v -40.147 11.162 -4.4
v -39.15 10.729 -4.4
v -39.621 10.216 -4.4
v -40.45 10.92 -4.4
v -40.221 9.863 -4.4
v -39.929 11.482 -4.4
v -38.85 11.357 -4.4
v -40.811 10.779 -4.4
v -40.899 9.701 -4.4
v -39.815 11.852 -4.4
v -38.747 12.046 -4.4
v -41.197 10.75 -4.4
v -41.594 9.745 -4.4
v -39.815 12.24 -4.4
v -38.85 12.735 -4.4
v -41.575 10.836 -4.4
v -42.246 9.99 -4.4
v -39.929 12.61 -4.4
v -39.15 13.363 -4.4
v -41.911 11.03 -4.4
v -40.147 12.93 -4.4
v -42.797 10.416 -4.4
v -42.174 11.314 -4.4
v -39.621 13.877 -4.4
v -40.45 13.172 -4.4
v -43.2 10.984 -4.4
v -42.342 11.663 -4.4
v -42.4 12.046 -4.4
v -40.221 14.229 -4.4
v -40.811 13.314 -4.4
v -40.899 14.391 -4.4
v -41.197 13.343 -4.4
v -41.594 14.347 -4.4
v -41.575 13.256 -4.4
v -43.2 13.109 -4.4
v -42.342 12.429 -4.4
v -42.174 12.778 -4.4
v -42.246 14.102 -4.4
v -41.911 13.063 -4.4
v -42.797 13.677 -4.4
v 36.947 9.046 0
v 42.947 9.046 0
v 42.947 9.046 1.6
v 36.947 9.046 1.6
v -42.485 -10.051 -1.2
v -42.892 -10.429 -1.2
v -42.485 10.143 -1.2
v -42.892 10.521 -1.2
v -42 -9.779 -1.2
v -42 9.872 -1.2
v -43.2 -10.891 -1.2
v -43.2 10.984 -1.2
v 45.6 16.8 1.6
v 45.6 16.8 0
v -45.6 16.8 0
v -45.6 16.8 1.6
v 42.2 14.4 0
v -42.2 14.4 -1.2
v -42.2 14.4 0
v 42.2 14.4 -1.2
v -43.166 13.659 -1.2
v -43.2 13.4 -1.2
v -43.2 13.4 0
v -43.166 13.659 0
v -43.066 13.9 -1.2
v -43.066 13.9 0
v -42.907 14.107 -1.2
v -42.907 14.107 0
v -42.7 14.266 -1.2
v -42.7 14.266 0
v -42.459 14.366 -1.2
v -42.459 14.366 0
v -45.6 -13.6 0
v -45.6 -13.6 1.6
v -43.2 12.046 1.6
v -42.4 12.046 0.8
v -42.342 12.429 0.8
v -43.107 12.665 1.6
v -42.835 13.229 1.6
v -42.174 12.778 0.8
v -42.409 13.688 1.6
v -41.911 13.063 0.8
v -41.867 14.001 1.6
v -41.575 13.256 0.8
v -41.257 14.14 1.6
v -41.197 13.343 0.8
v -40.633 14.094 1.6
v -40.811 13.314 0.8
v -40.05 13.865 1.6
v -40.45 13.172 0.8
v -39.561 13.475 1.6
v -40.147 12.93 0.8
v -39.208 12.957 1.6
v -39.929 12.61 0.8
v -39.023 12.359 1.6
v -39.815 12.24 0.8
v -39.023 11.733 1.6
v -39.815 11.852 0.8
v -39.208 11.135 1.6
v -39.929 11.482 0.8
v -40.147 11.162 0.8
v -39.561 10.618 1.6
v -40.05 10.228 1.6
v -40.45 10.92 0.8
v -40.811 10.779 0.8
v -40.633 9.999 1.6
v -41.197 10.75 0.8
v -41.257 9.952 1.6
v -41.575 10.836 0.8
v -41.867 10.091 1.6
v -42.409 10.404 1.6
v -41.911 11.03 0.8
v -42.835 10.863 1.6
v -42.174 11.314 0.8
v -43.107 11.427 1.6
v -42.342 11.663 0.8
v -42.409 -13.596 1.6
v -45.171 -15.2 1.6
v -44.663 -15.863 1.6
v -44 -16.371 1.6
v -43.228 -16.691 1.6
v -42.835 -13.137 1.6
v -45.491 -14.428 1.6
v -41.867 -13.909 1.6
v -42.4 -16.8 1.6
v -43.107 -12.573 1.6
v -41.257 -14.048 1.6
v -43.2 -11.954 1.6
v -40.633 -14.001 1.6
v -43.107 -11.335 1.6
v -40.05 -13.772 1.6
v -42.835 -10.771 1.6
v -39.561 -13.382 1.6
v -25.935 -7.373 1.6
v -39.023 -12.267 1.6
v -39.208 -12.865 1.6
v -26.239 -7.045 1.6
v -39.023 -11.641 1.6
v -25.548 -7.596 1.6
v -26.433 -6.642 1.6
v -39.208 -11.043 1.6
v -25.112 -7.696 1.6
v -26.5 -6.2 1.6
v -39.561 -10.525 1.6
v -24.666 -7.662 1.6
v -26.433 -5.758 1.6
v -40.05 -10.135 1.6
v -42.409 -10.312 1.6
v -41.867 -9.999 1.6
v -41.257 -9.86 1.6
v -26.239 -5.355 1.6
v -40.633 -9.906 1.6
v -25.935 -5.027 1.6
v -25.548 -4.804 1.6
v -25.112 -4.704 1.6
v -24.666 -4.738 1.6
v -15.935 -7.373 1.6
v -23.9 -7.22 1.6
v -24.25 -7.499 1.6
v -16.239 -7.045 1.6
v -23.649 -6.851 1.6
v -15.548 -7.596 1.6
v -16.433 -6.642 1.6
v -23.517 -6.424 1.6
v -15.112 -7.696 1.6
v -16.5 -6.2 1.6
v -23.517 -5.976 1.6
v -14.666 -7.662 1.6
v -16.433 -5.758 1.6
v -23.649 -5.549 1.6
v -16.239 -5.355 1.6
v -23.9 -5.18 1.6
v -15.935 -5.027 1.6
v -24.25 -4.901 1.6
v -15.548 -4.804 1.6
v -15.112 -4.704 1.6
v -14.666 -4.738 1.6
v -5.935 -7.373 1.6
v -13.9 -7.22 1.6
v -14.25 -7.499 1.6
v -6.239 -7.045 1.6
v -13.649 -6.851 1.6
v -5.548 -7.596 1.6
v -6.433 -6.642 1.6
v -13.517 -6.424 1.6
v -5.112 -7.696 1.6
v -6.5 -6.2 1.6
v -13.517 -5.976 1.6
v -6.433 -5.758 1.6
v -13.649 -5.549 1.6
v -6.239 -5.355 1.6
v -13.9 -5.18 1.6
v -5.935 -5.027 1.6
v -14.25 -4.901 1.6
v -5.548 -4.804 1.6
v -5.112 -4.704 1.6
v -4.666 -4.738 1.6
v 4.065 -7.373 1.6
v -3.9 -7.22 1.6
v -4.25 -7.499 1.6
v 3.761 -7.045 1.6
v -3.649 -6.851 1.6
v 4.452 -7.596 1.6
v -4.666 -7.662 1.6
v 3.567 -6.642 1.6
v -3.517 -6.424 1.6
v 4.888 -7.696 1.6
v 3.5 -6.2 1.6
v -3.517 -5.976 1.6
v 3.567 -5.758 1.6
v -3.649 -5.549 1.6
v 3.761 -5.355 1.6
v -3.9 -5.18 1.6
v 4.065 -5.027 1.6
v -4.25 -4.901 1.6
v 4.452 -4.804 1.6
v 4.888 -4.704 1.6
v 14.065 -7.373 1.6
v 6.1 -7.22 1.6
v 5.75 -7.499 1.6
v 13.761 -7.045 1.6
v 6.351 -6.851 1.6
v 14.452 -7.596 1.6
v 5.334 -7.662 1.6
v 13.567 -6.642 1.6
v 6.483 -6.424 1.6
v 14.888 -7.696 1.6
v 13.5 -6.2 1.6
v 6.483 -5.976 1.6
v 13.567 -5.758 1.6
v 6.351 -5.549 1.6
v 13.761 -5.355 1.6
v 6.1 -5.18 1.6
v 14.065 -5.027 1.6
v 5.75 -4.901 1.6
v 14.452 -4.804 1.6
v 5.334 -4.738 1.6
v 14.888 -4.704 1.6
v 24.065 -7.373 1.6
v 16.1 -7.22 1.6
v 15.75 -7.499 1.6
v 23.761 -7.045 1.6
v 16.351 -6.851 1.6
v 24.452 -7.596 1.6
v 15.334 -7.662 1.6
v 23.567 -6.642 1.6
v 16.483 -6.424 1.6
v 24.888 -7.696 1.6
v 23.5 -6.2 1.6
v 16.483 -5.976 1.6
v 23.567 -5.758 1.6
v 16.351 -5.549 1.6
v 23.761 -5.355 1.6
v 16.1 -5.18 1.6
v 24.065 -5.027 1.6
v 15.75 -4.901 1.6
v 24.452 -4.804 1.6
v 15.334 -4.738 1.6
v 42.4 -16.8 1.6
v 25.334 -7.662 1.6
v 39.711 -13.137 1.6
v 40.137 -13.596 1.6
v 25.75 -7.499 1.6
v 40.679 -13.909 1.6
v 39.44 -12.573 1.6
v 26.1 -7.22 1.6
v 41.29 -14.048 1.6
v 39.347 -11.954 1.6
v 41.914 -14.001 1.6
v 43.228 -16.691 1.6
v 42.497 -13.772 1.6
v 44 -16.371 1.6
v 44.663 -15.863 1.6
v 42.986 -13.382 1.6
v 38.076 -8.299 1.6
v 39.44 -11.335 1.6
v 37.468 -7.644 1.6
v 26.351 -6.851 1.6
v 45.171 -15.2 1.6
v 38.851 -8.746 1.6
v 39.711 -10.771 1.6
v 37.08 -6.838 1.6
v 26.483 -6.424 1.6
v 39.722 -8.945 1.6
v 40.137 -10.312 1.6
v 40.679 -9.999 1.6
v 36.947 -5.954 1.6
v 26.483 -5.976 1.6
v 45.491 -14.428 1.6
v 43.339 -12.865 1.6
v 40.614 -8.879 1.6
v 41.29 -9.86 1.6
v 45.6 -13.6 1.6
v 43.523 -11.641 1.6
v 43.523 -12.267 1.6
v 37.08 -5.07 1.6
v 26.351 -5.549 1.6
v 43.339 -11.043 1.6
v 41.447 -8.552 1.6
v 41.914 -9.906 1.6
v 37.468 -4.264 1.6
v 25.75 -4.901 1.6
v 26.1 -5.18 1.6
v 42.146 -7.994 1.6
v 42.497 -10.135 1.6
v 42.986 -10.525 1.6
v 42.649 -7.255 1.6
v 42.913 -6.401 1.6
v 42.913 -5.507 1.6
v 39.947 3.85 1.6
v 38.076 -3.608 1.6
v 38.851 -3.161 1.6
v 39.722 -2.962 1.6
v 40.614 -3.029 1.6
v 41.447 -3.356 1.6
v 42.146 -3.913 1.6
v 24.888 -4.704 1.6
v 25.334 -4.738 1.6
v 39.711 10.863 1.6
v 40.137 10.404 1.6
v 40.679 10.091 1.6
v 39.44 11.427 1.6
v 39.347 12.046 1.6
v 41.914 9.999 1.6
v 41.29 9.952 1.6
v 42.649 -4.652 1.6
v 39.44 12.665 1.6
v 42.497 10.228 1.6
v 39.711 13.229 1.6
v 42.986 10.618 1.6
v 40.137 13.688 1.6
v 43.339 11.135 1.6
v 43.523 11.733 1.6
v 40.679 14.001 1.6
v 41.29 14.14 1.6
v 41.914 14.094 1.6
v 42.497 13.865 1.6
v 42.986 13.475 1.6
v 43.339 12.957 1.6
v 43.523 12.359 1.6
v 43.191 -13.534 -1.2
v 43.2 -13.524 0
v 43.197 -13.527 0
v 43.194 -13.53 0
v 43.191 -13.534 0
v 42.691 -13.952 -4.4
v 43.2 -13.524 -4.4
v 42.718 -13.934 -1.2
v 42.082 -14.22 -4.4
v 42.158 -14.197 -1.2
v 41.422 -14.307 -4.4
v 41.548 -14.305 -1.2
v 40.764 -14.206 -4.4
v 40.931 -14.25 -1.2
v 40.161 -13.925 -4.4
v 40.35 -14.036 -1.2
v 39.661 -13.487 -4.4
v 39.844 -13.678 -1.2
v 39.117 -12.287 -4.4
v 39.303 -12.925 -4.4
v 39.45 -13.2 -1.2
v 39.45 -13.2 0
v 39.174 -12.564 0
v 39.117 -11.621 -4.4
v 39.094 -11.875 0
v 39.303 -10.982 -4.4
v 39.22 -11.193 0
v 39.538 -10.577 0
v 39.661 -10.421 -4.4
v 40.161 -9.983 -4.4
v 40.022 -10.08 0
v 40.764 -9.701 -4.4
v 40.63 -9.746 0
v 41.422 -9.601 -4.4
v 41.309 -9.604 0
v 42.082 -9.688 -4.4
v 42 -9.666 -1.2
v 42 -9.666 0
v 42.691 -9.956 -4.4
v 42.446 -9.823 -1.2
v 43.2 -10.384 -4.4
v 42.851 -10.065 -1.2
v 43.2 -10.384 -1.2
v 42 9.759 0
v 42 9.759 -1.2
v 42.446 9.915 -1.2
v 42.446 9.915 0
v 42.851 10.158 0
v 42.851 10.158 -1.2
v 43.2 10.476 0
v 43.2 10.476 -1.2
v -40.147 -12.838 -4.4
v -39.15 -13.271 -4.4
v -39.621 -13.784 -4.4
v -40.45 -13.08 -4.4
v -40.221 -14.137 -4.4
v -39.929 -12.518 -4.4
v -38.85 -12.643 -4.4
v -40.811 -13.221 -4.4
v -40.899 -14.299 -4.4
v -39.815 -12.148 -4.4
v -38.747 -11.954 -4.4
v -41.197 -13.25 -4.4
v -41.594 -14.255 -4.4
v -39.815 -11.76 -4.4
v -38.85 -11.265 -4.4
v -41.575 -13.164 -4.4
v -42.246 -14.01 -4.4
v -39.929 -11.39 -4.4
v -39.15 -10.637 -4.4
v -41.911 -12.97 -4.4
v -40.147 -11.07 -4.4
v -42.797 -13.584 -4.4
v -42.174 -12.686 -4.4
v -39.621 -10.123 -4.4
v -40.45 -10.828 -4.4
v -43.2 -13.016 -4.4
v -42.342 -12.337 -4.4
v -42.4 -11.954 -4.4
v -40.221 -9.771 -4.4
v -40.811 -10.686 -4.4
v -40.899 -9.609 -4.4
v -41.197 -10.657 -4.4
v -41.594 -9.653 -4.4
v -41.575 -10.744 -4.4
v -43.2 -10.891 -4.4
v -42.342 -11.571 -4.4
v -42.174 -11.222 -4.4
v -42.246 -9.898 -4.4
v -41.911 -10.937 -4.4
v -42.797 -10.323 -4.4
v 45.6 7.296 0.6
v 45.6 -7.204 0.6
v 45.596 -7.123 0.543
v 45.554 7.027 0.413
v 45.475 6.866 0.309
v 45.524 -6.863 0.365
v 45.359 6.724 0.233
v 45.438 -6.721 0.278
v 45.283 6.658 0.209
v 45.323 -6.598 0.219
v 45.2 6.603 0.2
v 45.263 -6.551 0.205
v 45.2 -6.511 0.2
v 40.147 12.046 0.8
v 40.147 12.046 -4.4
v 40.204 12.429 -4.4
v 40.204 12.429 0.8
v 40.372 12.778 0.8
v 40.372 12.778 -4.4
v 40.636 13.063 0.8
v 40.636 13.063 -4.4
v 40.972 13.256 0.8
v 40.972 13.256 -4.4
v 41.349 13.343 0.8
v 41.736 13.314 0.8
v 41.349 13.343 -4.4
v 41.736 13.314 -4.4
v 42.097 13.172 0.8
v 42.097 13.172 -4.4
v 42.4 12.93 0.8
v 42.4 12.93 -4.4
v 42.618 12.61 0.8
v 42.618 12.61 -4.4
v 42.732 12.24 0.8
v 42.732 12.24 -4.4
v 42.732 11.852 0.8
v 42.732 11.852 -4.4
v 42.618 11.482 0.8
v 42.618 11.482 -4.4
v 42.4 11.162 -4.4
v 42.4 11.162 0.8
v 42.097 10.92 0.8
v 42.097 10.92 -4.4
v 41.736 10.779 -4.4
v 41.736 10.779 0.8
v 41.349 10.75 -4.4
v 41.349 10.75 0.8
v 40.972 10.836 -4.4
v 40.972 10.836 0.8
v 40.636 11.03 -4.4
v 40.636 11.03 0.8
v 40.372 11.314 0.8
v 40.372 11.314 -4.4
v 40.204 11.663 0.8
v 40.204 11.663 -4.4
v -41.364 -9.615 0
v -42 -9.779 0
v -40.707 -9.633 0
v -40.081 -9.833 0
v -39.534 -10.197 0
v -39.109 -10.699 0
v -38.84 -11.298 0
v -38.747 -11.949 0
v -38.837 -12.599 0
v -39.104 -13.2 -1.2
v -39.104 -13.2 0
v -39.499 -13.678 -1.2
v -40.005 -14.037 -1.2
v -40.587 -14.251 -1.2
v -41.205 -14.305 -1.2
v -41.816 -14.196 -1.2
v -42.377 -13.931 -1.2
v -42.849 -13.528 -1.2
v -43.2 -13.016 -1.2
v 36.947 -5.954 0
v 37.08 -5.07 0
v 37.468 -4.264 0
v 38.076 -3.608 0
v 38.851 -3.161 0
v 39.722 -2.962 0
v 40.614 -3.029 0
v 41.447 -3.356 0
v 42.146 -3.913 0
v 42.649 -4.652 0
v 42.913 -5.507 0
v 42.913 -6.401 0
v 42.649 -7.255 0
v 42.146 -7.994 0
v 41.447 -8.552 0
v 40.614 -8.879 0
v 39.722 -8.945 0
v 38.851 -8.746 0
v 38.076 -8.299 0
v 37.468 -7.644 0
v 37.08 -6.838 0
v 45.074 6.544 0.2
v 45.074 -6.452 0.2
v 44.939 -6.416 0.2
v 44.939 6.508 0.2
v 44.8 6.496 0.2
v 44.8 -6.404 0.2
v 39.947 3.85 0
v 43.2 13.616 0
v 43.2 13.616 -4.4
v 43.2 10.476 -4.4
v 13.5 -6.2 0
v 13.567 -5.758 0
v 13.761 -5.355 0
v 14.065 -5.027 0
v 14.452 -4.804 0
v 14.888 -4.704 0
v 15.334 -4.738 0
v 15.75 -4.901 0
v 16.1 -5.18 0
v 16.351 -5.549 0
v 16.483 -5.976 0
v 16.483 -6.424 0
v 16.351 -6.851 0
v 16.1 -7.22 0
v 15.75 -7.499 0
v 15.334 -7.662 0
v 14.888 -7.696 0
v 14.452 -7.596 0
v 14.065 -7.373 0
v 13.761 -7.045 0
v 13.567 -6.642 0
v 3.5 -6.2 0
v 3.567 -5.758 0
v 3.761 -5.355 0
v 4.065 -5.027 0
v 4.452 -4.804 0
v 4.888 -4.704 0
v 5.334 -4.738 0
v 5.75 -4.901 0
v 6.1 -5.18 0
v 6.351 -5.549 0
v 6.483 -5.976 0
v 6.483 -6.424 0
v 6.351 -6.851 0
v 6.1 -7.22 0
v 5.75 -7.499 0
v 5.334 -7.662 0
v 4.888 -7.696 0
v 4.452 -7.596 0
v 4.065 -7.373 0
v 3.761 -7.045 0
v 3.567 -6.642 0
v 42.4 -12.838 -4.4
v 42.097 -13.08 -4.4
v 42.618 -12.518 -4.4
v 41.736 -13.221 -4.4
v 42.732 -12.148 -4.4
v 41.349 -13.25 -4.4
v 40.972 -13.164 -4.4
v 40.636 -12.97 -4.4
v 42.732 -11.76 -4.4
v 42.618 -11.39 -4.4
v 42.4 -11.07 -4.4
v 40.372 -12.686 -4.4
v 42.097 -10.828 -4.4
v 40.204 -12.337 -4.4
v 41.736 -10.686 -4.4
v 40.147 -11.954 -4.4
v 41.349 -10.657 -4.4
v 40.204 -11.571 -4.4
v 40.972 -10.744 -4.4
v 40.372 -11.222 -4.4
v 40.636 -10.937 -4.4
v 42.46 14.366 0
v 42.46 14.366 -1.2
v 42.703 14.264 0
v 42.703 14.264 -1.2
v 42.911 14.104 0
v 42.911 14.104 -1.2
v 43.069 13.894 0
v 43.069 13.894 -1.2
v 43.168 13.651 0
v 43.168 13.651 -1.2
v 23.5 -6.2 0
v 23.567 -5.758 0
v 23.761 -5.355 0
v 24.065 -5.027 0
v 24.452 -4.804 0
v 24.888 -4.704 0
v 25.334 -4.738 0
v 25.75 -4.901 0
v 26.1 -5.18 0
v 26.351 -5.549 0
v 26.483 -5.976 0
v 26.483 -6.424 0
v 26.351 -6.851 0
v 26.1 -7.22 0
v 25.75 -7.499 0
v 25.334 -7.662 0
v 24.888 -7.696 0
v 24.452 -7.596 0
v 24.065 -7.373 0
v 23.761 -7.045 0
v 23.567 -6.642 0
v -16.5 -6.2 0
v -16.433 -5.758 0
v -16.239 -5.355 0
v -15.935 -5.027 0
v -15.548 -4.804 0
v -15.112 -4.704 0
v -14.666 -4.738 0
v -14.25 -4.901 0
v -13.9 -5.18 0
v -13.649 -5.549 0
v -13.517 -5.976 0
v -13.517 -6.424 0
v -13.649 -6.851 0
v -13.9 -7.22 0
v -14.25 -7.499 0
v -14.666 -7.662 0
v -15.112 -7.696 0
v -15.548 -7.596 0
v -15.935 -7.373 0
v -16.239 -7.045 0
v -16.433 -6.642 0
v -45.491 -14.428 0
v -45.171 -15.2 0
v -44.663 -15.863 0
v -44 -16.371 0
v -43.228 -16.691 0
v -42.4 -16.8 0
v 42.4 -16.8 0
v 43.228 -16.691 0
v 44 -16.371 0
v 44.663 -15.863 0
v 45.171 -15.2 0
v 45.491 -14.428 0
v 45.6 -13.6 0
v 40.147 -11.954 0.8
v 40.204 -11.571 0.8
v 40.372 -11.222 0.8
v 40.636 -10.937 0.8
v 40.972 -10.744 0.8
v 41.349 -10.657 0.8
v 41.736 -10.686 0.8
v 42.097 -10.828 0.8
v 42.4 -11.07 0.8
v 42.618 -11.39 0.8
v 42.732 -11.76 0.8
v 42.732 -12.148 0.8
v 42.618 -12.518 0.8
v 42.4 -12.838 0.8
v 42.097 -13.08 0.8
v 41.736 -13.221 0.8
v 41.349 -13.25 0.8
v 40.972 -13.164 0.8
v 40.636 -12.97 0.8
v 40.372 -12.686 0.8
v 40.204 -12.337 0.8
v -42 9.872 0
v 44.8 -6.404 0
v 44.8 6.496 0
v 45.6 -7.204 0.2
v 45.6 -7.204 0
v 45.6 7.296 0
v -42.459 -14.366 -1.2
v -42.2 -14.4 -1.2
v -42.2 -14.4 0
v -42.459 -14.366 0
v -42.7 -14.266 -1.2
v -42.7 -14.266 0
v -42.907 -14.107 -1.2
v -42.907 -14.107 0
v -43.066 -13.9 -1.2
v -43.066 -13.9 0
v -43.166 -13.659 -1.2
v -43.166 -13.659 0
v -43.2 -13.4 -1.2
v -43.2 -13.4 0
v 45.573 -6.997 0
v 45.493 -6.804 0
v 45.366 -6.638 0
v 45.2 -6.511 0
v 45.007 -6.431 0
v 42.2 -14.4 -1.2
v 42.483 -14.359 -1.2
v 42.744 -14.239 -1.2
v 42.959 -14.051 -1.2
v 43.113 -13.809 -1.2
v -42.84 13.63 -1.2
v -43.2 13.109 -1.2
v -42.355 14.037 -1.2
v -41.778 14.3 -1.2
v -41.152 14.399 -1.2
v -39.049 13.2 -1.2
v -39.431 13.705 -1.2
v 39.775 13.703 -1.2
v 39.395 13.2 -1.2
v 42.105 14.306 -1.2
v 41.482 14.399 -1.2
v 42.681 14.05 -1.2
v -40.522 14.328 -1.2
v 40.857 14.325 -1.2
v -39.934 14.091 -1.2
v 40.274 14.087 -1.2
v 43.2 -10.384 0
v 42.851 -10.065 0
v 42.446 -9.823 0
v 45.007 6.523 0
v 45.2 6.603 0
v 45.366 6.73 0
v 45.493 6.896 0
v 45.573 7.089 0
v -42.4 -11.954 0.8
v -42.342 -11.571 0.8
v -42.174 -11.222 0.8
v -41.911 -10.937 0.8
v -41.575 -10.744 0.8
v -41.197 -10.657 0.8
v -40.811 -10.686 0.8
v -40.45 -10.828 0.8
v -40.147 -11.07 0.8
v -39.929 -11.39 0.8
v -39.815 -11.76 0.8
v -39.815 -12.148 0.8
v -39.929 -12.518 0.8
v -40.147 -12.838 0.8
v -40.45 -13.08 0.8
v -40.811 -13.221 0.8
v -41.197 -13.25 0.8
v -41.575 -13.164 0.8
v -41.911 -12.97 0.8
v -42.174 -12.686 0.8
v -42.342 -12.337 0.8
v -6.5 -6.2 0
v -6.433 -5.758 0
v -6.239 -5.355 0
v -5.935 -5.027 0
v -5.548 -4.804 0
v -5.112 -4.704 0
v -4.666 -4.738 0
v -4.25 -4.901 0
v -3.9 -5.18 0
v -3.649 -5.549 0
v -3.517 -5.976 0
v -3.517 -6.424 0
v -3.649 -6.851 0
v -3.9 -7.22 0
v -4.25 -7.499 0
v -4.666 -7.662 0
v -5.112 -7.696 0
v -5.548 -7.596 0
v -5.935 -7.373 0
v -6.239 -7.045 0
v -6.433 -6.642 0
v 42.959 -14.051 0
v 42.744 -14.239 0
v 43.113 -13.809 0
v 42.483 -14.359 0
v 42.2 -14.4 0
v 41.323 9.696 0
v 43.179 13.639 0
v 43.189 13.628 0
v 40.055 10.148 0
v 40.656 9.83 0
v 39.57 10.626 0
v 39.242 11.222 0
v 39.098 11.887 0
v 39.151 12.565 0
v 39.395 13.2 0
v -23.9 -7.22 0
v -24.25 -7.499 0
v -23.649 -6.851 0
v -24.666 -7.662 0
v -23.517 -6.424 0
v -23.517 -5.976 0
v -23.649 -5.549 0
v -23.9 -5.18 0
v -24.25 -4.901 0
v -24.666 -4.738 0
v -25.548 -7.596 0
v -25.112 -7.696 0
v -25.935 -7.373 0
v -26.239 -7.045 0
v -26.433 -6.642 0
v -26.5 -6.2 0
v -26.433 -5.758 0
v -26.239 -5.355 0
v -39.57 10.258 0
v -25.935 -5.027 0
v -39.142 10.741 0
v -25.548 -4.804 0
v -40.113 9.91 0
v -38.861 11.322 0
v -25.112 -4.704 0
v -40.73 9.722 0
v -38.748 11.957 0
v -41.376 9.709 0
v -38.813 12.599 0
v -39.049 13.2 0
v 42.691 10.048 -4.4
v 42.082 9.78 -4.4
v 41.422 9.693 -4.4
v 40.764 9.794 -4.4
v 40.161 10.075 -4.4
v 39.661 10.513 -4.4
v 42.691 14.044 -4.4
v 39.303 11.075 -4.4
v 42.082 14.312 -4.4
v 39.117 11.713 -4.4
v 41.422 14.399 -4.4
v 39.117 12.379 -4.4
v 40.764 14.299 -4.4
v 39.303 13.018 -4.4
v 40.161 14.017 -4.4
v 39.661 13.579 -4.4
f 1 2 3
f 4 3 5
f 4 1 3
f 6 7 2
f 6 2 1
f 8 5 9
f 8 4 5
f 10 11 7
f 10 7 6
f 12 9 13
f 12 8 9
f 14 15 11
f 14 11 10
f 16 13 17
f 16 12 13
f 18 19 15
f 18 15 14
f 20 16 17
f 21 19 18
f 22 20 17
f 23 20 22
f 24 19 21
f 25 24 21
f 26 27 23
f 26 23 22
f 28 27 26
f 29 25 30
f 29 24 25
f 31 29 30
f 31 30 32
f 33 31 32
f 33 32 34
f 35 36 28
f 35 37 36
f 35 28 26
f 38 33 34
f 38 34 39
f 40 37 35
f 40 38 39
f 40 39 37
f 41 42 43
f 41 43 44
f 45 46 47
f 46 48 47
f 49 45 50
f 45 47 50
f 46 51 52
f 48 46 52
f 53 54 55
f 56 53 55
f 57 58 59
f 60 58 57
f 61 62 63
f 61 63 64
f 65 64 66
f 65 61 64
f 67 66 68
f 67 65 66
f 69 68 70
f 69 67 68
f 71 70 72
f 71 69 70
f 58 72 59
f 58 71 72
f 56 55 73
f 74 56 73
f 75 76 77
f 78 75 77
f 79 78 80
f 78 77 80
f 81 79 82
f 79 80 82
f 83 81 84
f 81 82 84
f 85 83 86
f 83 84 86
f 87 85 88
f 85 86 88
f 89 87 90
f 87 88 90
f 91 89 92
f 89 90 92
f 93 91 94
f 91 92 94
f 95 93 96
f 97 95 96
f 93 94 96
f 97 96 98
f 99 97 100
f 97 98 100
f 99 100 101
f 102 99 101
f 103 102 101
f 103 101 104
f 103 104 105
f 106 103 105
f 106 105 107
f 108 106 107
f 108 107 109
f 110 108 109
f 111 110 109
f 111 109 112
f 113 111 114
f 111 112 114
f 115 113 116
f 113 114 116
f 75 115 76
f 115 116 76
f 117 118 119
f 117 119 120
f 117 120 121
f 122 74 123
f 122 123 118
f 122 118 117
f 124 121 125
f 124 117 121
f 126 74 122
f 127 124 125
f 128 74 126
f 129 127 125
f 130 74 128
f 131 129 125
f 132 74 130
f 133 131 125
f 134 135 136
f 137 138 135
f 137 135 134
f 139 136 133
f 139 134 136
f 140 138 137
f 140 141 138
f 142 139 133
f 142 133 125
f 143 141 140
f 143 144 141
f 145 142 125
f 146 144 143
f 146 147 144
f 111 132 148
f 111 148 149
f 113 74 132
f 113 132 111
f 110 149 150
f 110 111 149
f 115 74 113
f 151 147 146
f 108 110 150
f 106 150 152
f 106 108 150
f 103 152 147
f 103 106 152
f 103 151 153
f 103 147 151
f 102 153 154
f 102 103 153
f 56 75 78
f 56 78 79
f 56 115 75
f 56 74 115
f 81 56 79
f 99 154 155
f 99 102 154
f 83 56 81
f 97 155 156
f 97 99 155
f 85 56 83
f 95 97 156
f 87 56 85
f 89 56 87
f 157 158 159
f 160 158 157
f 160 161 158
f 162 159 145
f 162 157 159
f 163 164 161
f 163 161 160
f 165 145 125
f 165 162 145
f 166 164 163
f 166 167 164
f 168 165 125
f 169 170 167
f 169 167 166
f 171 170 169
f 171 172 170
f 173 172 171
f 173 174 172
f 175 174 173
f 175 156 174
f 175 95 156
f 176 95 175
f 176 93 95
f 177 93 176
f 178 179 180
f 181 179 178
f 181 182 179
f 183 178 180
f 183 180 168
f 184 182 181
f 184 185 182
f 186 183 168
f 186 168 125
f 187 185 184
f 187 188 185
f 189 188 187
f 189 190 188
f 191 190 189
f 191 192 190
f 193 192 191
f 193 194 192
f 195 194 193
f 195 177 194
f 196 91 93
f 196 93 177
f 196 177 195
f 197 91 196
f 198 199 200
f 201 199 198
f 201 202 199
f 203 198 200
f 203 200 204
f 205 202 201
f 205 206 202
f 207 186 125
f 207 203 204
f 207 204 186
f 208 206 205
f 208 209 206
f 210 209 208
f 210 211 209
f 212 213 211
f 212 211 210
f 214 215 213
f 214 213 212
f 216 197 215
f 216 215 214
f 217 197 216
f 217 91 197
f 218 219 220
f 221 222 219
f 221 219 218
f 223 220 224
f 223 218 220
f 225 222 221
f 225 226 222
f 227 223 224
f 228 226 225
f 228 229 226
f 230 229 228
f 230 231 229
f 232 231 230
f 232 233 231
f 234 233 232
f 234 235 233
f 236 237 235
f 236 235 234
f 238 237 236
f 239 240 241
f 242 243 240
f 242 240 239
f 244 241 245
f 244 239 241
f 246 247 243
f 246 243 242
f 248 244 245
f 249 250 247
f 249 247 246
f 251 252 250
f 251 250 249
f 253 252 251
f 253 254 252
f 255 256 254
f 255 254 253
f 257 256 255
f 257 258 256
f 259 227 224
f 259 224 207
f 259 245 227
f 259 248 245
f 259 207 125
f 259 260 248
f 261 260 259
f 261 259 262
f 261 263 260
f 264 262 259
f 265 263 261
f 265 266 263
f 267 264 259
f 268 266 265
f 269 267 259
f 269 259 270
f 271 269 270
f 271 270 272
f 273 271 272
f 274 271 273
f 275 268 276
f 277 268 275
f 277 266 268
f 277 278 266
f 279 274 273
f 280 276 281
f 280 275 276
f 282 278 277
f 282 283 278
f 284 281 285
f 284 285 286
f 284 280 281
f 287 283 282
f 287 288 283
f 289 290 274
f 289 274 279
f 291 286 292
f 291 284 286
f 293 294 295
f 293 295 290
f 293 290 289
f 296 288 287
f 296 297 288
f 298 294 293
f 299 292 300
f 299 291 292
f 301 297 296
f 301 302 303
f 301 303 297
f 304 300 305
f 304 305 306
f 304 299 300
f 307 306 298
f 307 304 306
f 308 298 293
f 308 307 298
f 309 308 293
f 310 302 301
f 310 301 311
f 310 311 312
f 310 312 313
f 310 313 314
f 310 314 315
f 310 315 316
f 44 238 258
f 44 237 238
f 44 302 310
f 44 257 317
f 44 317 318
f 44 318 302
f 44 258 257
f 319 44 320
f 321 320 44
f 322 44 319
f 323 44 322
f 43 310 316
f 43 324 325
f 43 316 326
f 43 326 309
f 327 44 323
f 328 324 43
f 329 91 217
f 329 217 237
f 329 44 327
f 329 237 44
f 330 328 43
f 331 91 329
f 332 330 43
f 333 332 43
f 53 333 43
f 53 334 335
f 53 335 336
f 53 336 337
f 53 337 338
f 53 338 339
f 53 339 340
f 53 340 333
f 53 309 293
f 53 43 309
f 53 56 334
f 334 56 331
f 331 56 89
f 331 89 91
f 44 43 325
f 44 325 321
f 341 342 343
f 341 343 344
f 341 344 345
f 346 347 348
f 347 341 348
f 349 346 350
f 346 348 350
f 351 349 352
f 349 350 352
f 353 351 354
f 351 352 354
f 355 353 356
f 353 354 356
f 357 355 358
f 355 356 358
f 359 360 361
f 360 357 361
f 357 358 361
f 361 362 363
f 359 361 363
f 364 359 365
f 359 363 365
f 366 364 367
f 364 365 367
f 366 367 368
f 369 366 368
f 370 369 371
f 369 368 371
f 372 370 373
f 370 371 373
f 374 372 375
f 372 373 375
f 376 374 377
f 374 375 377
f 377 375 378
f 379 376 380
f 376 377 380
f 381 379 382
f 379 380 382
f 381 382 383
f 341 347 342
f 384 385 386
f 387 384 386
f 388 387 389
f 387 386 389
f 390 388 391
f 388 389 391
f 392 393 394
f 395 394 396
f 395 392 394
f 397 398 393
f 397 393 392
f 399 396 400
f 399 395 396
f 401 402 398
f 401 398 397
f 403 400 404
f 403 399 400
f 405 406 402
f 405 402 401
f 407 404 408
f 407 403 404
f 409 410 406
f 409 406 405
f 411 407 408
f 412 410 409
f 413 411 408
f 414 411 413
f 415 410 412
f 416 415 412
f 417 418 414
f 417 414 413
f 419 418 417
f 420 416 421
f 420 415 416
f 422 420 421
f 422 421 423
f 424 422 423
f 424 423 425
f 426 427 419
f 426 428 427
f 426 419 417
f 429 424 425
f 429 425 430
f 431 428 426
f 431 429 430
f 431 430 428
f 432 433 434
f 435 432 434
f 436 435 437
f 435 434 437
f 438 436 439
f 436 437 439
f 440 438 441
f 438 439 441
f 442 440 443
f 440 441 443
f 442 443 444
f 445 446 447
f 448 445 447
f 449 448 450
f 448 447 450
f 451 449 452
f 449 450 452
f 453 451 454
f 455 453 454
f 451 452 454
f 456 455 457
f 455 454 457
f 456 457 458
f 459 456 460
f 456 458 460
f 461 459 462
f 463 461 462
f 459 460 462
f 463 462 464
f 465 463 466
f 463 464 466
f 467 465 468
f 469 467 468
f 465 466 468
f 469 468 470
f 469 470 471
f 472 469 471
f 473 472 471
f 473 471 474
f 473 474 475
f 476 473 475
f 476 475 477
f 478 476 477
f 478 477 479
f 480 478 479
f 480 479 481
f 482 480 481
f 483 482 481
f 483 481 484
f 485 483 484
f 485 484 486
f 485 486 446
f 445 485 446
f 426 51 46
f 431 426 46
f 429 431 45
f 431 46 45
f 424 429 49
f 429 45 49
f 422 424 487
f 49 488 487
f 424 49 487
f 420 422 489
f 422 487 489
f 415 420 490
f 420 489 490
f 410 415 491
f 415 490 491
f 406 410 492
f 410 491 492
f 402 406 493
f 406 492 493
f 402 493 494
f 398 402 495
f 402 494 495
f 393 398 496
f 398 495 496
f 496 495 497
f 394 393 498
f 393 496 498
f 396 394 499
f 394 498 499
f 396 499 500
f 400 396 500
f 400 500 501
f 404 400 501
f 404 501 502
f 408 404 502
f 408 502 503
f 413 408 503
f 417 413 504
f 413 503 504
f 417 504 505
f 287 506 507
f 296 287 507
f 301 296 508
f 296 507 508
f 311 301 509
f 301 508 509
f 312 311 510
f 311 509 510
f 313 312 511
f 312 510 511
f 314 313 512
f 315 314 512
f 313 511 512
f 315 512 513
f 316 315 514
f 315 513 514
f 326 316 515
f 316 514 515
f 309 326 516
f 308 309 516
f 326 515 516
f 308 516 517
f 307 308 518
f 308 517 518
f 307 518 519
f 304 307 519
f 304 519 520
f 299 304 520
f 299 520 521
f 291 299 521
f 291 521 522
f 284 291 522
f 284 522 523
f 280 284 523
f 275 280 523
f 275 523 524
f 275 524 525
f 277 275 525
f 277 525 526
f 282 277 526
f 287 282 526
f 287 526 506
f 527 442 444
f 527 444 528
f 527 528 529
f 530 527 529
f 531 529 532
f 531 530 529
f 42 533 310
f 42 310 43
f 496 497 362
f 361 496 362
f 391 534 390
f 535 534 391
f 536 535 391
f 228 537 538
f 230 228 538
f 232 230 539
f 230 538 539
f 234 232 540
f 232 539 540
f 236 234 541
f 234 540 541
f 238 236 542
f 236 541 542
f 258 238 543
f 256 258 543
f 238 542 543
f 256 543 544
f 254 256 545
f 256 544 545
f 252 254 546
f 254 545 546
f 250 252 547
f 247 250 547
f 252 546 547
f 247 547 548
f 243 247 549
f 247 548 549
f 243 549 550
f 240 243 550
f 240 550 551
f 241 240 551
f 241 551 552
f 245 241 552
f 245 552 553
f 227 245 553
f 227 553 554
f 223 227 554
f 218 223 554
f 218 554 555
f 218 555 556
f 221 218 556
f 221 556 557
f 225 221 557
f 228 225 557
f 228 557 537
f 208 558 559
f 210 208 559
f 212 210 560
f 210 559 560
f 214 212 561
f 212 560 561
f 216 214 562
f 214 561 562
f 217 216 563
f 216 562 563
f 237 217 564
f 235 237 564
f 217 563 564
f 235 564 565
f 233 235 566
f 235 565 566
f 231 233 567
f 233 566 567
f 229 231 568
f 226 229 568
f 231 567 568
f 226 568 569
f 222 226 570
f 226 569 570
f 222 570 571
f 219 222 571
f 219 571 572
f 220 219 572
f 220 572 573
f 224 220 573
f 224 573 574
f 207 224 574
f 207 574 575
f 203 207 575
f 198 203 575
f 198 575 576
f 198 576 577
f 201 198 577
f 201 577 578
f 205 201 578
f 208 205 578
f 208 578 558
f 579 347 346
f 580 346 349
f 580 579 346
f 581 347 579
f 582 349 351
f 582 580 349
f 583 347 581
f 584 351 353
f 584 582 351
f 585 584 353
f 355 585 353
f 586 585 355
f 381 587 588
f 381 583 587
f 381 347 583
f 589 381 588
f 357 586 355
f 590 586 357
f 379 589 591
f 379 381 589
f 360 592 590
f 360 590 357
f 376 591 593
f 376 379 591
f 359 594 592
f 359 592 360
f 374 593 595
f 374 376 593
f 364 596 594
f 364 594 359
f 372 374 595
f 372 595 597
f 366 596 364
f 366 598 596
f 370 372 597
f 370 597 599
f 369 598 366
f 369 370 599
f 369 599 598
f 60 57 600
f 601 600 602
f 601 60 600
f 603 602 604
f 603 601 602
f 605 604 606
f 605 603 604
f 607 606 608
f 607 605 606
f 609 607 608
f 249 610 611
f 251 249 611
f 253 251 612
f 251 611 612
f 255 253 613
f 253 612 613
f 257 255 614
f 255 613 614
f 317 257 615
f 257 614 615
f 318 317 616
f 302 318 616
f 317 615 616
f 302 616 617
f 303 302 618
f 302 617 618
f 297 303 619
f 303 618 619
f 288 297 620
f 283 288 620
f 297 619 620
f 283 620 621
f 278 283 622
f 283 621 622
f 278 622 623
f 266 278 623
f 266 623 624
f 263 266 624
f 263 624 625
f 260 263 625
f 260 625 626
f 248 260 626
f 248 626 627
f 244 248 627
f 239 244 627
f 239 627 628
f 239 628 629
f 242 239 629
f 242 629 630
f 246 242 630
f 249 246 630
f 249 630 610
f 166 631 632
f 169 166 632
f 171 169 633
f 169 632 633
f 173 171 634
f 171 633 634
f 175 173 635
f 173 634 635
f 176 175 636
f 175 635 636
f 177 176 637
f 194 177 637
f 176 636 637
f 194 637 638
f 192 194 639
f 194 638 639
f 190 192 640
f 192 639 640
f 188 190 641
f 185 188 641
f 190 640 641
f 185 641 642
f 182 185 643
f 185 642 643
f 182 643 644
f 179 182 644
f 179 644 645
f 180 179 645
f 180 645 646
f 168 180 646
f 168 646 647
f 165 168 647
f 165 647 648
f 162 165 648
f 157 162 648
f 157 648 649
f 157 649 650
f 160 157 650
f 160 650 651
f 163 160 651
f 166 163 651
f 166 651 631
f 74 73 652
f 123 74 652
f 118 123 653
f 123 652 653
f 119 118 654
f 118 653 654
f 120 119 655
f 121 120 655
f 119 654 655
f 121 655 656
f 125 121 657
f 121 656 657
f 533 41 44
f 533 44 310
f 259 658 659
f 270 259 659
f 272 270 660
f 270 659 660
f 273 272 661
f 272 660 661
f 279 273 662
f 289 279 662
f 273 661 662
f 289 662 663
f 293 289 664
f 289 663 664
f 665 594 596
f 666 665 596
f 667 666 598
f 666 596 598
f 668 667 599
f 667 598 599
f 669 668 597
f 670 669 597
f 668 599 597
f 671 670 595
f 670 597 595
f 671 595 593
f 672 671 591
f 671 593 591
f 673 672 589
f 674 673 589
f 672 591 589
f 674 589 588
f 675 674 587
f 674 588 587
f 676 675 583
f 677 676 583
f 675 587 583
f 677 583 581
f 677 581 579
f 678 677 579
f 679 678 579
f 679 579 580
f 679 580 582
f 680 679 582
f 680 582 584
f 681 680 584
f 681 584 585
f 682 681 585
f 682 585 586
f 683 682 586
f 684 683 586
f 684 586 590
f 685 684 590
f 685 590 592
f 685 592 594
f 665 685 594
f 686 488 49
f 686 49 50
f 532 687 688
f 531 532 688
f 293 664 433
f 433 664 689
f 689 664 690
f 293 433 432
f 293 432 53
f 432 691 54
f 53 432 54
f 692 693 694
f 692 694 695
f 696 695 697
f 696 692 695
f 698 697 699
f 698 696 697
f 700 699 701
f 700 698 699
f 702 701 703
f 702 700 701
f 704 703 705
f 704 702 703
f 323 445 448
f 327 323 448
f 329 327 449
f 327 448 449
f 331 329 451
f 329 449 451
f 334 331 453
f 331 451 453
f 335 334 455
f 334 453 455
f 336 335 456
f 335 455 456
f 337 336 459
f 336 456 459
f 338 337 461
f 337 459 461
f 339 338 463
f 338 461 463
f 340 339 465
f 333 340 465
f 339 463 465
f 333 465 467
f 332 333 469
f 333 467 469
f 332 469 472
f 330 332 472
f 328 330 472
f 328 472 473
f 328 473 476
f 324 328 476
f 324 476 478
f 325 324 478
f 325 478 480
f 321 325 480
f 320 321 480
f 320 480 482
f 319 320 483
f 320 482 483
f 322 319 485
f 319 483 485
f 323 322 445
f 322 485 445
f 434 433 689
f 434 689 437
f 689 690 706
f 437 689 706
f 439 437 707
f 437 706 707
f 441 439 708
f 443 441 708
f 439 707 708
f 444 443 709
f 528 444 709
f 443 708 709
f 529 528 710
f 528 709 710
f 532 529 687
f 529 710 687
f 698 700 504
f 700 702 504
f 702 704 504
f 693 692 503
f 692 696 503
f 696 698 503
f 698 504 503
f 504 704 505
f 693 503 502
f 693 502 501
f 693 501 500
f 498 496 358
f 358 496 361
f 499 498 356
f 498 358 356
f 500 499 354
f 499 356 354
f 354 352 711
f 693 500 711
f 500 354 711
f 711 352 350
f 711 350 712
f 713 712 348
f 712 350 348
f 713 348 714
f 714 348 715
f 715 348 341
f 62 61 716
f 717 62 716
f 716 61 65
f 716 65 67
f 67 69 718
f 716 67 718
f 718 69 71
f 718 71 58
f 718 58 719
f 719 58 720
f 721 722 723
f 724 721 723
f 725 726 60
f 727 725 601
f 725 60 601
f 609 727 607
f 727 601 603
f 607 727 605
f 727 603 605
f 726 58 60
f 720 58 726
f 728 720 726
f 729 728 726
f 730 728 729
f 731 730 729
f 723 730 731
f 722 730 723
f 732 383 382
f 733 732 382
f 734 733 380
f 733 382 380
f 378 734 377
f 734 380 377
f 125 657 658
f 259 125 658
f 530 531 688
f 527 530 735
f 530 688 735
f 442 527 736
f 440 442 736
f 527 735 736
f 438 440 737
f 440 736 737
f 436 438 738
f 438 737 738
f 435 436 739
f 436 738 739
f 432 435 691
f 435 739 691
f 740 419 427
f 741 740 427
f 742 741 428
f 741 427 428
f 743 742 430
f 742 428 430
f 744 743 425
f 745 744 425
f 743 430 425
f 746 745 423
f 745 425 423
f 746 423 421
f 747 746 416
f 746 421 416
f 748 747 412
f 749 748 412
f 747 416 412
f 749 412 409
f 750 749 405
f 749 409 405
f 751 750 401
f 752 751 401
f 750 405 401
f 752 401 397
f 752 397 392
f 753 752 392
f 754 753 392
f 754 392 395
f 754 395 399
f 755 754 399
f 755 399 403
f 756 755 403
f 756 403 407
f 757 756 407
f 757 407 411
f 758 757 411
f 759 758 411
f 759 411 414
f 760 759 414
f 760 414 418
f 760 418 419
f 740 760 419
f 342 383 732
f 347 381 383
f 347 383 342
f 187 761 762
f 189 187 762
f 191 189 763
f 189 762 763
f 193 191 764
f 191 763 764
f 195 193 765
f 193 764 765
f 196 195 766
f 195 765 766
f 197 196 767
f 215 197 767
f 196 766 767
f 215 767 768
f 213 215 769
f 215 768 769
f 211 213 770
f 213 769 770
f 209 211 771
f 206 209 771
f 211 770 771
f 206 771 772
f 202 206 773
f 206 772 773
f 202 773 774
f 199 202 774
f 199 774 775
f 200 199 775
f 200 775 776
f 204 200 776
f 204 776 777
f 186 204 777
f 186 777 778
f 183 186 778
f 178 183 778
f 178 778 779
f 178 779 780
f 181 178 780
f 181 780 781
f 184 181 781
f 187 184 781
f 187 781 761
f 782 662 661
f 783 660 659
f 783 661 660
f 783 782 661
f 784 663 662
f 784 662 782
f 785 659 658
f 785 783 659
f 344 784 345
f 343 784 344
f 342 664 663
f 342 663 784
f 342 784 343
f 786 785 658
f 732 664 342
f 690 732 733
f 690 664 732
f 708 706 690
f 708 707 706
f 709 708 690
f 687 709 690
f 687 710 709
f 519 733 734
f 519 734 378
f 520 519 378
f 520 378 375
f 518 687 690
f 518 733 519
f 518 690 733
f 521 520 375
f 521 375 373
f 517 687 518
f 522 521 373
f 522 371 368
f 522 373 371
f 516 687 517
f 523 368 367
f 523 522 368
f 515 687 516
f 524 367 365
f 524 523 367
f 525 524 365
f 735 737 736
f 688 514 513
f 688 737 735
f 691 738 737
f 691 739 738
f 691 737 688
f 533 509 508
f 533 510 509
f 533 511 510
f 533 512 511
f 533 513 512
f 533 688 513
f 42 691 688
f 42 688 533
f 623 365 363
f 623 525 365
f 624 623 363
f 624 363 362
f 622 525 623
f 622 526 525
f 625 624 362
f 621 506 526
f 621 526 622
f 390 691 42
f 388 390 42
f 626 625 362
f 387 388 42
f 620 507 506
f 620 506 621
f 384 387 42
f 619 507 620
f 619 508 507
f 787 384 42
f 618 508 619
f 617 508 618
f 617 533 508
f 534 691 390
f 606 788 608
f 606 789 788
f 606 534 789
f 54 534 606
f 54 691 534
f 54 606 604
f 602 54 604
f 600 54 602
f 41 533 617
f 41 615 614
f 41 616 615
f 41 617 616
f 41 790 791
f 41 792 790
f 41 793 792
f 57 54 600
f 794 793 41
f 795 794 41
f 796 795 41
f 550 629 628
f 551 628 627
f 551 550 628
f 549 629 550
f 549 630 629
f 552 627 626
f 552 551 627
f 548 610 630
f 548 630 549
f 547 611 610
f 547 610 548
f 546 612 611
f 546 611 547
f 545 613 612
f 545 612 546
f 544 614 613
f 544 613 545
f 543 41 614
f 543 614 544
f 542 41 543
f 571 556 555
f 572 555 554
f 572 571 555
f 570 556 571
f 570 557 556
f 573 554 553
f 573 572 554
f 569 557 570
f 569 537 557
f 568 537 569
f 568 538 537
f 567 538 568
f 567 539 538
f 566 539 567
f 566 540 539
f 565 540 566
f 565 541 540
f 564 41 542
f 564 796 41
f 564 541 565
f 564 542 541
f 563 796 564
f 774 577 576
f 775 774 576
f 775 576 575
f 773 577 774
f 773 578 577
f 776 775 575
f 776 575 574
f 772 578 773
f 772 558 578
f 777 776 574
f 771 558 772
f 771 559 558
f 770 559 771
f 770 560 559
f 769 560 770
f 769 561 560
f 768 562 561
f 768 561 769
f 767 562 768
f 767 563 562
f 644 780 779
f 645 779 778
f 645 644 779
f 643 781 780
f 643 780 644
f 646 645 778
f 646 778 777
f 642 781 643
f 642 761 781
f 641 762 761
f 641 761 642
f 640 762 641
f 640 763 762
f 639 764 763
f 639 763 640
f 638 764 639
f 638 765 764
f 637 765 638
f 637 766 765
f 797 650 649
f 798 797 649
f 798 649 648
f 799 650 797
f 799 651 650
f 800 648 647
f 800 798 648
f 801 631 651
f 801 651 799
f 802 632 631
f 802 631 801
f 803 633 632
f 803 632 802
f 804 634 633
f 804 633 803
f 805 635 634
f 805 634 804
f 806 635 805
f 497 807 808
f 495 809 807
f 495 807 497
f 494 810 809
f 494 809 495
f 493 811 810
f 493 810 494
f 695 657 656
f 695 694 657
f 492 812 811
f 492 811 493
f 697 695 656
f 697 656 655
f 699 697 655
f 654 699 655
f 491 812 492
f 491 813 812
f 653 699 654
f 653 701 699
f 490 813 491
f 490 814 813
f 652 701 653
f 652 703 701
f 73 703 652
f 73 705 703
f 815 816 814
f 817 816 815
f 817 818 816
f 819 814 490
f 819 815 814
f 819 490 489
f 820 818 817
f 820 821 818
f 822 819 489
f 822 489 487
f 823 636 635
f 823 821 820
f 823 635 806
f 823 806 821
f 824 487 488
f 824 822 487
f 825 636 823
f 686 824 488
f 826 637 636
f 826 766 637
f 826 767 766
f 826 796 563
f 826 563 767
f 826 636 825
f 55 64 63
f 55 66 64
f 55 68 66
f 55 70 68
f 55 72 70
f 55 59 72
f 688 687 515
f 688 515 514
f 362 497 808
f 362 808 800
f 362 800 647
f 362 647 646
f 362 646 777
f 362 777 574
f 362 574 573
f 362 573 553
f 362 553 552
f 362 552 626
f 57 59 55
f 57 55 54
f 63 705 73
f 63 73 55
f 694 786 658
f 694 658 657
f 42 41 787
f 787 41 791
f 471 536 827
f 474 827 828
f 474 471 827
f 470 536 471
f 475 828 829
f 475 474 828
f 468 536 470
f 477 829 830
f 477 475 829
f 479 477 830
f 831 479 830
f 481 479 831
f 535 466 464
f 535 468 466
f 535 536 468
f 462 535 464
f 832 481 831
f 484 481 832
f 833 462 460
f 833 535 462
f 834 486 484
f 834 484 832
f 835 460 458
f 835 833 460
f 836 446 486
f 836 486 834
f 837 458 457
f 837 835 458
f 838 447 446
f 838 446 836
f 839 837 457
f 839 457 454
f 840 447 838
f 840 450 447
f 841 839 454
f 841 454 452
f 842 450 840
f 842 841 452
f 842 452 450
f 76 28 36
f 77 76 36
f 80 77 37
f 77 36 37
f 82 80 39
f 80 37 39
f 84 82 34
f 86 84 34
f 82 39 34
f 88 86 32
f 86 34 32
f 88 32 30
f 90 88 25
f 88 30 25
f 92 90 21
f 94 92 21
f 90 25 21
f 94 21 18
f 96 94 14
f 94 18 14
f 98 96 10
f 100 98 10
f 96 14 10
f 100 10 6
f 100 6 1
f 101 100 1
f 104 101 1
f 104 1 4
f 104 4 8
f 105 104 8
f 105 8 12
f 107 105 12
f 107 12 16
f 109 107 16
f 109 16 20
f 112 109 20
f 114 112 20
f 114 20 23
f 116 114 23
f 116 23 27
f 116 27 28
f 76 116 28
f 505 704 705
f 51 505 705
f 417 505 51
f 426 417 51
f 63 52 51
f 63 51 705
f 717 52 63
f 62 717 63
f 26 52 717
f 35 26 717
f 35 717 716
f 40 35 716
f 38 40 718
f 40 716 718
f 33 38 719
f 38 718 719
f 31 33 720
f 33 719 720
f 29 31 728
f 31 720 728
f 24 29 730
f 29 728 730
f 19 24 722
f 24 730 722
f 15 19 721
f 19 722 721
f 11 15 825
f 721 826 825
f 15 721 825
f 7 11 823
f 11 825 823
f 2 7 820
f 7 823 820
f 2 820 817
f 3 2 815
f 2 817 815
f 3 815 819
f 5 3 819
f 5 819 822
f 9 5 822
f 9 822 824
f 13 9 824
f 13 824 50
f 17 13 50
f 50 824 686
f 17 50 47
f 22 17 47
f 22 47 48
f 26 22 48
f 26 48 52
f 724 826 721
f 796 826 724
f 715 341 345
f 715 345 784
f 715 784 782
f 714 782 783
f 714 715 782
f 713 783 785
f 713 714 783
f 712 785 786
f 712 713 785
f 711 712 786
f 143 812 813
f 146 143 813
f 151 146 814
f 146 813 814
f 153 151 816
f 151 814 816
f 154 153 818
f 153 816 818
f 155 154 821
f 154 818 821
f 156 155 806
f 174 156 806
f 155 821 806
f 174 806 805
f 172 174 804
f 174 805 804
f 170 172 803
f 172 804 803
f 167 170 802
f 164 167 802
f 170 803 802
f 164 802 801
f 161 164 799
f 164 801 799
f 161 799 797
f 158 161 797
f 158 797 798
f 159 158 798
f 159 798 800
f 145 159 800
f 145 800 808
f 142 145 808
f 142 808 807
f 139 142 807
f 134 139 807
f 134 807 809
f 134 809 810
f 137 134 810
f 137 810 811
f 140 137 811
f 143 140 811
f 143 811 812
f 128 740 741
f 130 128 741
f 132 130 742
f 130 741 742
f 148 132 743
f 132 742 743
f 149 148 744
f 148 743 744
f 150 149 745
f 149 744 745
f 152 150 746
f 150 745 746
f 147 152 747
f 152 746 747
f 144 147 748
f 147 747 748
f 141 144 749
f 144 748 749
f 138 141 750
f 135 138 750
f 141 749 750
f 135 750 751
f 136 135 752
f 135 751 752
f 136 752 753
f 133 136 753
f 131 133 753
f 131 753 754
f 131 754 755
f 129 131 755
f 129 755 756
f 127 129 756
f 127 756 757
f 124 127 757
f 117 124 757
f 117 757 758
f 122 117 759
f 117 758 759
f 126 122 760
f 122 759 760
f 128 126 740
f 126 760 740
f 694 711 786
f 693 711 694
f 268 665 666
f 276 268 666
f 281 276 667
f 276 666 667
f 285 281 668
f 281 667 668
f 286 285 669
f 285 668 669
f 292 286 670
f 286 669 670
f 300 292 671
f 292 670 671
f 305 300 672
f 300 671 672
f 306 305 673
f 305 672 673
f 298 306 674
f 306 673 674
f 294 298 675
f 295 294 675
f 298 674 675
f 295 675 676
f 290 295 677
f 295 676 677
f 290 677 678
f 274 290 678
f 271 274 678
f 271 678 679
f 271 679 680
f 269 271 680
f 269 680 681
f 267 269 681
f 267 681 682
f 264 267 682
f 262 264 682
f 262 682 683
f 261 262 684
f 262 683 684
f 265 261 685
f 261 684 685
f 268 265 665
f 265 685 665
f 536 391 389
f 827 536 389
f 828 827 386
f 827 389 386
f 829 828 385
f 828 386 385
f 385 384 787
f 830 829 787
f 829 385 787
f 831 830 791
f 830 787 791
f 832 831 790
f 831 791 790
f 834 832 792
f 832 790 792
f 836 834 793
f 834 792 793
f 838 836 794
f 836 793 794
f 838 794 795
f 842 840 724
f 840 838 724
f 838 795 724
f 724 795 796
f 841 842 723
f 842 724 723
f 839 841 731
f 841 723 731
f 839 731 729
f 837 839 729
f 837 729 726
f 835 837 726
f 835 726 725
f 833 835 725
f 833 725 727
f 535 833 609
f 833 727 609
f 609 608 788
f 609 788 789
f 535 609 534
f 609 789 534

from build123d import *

# Parameters (mm, degrees)
EXTRUDE_1_DEPTH     = 1.6
SKETCH_3_W          = 84
SKETCH_3_H          = 26.4
EXTRUDE_1_2_DEPTH   = 2.8
CUT_EXTRUDE_1_DEPTH = 1.2
SKETCH_8_R          = 2.35345012
EXTRUDE_2_DEPTH     = 4.4
CUT_EXTRUDE_2_DEPTH = 0.2
FILLET_2_R          = 0.4
SKETCH_10_W         = 2.4
SKETCH_10_H         = 27.704592787
SKETCH_10_H_2       = 28.279400909
CUT_EXTRUDE_3_DEPTH = 12
SKETCH_11_R         = 1.3
CUT_EXTRUDE_4_DEPTH = 12
CHAMFER_1_SIZE      = 0.8
SKETCH_12_R         = 1.5
CUT_EXTRUDE_5_DEPTH = 12
SKETCH_13_R         = 3
CUT_EXTRUDE_6_DEPTH = 12
CUT_EXTRUDE_7_DEPTH = 1.2
SKETCH_15_R         = 1.5
EXTRUDE_4_DEPTH     = 1.6


with BuildPart() as part:
    # Эскиз2 → Extrude 1 (new body)
    with BuildSketch(Plane.XY):
        with BuildLine():
            Line((45.6, -13.6), (45.6, -7.203828964))
            Line((45.6, -7.203828964), (45.6, 7.296171036))
            Line((45.6, 7.296171036), (45.6, 16.8))
            Line((45.6, 16.8), (42.6, 16.8))
            Line((42.6, 16.8), (39.6, 16.8))
            Line((39.6, 16.8), (-39.6, 16.8))
            Line((-39.6, 16.8), (-42.6, 16.8))
            Line((-42.6, 16.8), (-45.6, 16.8))
            Line((-45.6, 16.8), (-45.6, -13.6))
            ThreePointArc((-45.6, -13.6), (-44.6627417, -15.8627417), (-42.4, -16.8))
            Line((-42.4, -16.8), (42.4, -16.8))
            ThreePointArc((42.4, -16.8), (44.6627417, -15.8627417), (45.6, -13.6))
        make_face()
    extrude(amount=EXTRUDE_1_DEPTH)

    # Эскиз3 → Extrude 1 2 (add)
    with BuildSketch(Plane.XY.offset(1.6)):
        with BuildLine():
            Line((-42.2, -15), (42.2, -15))
            ThreePointArc((42.2, -15), (43.33137085, -14.53137085), (43.8, -13.4))
            Line((43.8, -13.4), (43.8, 13.4))
            ThreePointArc((43.8, 13.4), (43.33137085, 14.53137085), (42.2, 15))
            Line((42.2, 15), (-42.2, 15))
            ThreePointArc((-42.2, 15), (-43.33137085, 14.53137085), (-43.8, 13.4))
            Line((-43.8, 13.4), (-43.8, -13.4))
            ThreePointArc((-43.8, -13.4), (-43.33137085, -14.53137085), (-42.2, -15))
        make_face()
        Rectangle(SKETCH_3_W, SKETCH_3_H, mode=Mode.SUBTRACT)
    extrude(amount=-EXTRUDE_1_2_DEPTH)

    # Эскиз4 → Вырез-Вытянуть-Тонкостенный1 (cut)
    with BuildSketch(Plane(origin=(0, 0, -1.2), x_dir=(-1, 0, 0), z_dir=(0, 0, -1))):
        with BuildLine():
            Line((-43.8, 13.4), (-43.8, -13.4))
            ThreePointArc((-43.8, -13.4), (-43.33137085, -14.53137085), (-42.2, -15))
            Line((-42.2, -15), (42.2, -15))
            ThreePointArc((42.2, -15), (43.33137085, -14.53137085), (43.8, -13.4))
            Line((43.8, -13.4), (43.8, 13.4))
            ThreePointArc((43.8, 13.4), (43.33137085, 14.53137085), (42.2, 15))
            Line((42.2, 15), (-42.2, 15))
            ThreePointArc((-42.2, 15), (-43.33137085, 14.53137085), (-43.8, 13.4))
        make_face()
        with BuildLine():
            Line((-43.2, 13.4), (-43.2, -13.4))
            ThreePointArc((-43.2, -13.4), (-42.907106781, -14.107106781), (-42.2, -14.4))
            Line((-42.2, -14.4), (42.2, -14.4))
            ThreePointArc((42.2, -14.4), (42.907106781, -14.107106781), (43.2, -13.4))
            Line((43.2, -13.4), (43.2, 13.4))
            ThreePointArc((43.2, 13.4), (42.907106781, 14.107106781), (42.2, 14.4))
            Line((42.2, 14.4), (-42.2, 14.4))
            ThreePointArc((-42.2, 14.4), (-42.907106781, 14.107106781), (-43.2, 13.4))
        make_face(mode=Mode.SUBTRACT)
    extrude(amount=-CUT_EXTRUDE_1_DEPTH, mode=Mode.SUBTRACT)

    # Эскиз8 → Бобышка-Вытянуть2 (add)
    with BuildSketch(Plane(origin=(0, 0, 0), x_dir=(-1, 0, 0), z_dir=(0, 0, -1))):
        with Locations((-41.44654988, 12.046171036)):
            Circle(SKETCH_8_R)
        with Locations((-41.44654988, -11.953828964)):
            Circle(SKETCH_8_R)
        with Locations((41.1, 12.046171036)):
            Circle(SKETCH_8_R)
        with Locations((41.1, -11.953828964)):
            Circle(SKETCH_8_R)
    extrude(amount=EXTRUDE_2_DEPTH)

    # Эскиз9 → Вырез-Вытянуть2 (cut)
    with BuildSketch(Plane(origin=(0, 0, 0), x_dir=(-1, 0, 0), z_dir=(0, 0, -1))):
        with BuildLine():
            Line((-44.8, -6.403828964), (-44.8, 6.496171036))
            ThreePointArc((-44.8, 6.496171036), (-45.365685425, 6.730485611), (-45.6, 7.296171036))
            Line((-45.6, 7.296171036), (-45.6, -7.203828964))
            ThreePointArc((-45.6, -7.203828964), (-45.365685425, -6.638143539), (-44.8, -6.403828964))
        make_face()
    extrude(amount=-CUT_EXTRUDE_2_DEPTH, mode=Mode.SUBTRACT)

    # Скругление2
    fillet_2_edges = [part.edges().sort_by_distance(p)[0] for p in [
        (45.6, 0.046171036, 0.2),
    ]]
    fillet(fillet_2_edges, radius=FILLET_2_R)

    # Эскиз10 → Вырез-Вытянуть3 (cut)
    with BuildSketch(Plane(origin=(0, 0, 0), x_dir=(-1, 0, 0), z_dir=(0, 0, -1))):
        with Locations((-44.4, 0.252296393)):
            Rectangle(SKETCH_10_W, SKETCH_10_H)
        with Locations((44.4, 0.539700455)):
            Rectangle(SKETCH_10_W, SKETCH_10_H_2)
    extrude(amount=CUT_EXTRUDE_3_DEPTH, mode=Mode.SUBTRACT)

    # Эскиз11 → Вырез-Вытянуть4 (cut)
    with BuildSketch(Plane(origin=(0, 0, -4.4), x_dir=(-1, 0, 0), z_dir=(0, 0, -1))):
        with Locations((-41.44654988, 12.046171036)):
            Circle(SKETCH_11_R)
        with Locations((-41.44654988, -11.953828964)):
            Circle(SKETCH_11_R)
        with Locations((41.1, -11.953828964)):
            Circle(SKETCH_11_R)
        with Locations((41.1, 12.046171036)):
            Circle(SKETCH_11_R)
    extrude(amount=-CUT_EXTRUDE_4_DEPTH, mode=Mode.SUBTRACT)

    # Фаска1
    chamfer_1_edges = [part.edges().sort_by_distance(p)[0] for p in [
        (-39.8, 12.046171036, 1.6),
        (-39.8, -11.953828964, 1.6),
        (42.74654988, -11.953828964, 1.6),
        (42.74654988, 12.046171036, 1.6),
    ]]
    chamfer(chamfer_1_edges, length=CHAMFER_1_SIZE)

    # Эскиз12 → Вырез-Вытянуть5 (cut)
    with BuildSketch(Plane(origin=(0, 0, 0), x_dir=(-1, 0, 0), z_dir=(0, 0, -1))):
        with Locations((-35, -6.2)):
            Circle(SKETCH_12_R)
        with Locations((-25, -6.2)):
            Circle(SKETCH_12_R)
        with Locations((-15, -6.2)):
            Circle(SKETCH_12_R)
        with Locations((-5, -6.2)):
            Circle(SKETCH_12_R)
        with Locations((5, -6.2)):
            Circle(SKETCH_12_R)
        with Locations((15, -6.2)):
            Circle(SKETCH_12_R)
        with Locations((25, -6.2)):
            Circle(SKETCH_12_R)
        with Locations((35, -6.2)):
            Circle(SKETCH_12_R)
    extrude(amount=-CUT_EXTRUDE_5_DEPTH, mode=Mode.SUBTRACT)

    # Эскиз13 → Вырез-Вытянуть6 (cut)
    with BuildSketch(Plane(origin=(0, 0, 0), x_dir=(-1, 0, 0), z_dir=(0, 0, -1))):
        with Locations((-39.94654988, -5.953828964)):
            Circle(SKETCH_13_R)
        Polygon((-42.94654988, 9.046171036), (-36.94654988, 9.046171036), (-39.94654988, 3.850018614), align=None)
    extrude(amount=-CUT_EXTRUDE_6_DEPTH, mode=Mode.SUBTRACT)

    # Эскиз14 → Вырез-Вытянуть7 (cut)
    with BuildSketch(Plane(origin=(0, 0, -1.2), x_dir=(-1, 0, 0), z_dir=(0, 0, -1))):
        with BuildLine():
            Line((-42, -9.666380509), (-42, 9.758722582))
            ThreePointArc((-42, 9.758722582), (-42.654530459, 10.026391249), (-43.2, 10.476413047))
            Line((-43.2, 10.476413047), (-43.2, -10.384070975))
            ThreePointArc((-43.2, -10.384070975), (-42.654530459, -9.934049177), (-42, -9.666380509))
        make_face()
    extrude(amount=-CUT_EXTRUDE_7_DEPTH, mode=Mode.SUBTRACT)

    # Эскиз15 → Бобышка-Вытянуть4 (add)
    with BuildSketch(Plane(origin=(0, 0, 0), x_dir=(-1, 0, 0), z_dir=(0, 0, -1))):
        with Locations((35, -6.2)):
            Circle(SKETCH_15_R)
        with Locations((-35, -6.2)):
            Circle(SKETCH_15_R)
    extrude(amount=-EXTRUDE_4_DEPTH)


solid = part.part
